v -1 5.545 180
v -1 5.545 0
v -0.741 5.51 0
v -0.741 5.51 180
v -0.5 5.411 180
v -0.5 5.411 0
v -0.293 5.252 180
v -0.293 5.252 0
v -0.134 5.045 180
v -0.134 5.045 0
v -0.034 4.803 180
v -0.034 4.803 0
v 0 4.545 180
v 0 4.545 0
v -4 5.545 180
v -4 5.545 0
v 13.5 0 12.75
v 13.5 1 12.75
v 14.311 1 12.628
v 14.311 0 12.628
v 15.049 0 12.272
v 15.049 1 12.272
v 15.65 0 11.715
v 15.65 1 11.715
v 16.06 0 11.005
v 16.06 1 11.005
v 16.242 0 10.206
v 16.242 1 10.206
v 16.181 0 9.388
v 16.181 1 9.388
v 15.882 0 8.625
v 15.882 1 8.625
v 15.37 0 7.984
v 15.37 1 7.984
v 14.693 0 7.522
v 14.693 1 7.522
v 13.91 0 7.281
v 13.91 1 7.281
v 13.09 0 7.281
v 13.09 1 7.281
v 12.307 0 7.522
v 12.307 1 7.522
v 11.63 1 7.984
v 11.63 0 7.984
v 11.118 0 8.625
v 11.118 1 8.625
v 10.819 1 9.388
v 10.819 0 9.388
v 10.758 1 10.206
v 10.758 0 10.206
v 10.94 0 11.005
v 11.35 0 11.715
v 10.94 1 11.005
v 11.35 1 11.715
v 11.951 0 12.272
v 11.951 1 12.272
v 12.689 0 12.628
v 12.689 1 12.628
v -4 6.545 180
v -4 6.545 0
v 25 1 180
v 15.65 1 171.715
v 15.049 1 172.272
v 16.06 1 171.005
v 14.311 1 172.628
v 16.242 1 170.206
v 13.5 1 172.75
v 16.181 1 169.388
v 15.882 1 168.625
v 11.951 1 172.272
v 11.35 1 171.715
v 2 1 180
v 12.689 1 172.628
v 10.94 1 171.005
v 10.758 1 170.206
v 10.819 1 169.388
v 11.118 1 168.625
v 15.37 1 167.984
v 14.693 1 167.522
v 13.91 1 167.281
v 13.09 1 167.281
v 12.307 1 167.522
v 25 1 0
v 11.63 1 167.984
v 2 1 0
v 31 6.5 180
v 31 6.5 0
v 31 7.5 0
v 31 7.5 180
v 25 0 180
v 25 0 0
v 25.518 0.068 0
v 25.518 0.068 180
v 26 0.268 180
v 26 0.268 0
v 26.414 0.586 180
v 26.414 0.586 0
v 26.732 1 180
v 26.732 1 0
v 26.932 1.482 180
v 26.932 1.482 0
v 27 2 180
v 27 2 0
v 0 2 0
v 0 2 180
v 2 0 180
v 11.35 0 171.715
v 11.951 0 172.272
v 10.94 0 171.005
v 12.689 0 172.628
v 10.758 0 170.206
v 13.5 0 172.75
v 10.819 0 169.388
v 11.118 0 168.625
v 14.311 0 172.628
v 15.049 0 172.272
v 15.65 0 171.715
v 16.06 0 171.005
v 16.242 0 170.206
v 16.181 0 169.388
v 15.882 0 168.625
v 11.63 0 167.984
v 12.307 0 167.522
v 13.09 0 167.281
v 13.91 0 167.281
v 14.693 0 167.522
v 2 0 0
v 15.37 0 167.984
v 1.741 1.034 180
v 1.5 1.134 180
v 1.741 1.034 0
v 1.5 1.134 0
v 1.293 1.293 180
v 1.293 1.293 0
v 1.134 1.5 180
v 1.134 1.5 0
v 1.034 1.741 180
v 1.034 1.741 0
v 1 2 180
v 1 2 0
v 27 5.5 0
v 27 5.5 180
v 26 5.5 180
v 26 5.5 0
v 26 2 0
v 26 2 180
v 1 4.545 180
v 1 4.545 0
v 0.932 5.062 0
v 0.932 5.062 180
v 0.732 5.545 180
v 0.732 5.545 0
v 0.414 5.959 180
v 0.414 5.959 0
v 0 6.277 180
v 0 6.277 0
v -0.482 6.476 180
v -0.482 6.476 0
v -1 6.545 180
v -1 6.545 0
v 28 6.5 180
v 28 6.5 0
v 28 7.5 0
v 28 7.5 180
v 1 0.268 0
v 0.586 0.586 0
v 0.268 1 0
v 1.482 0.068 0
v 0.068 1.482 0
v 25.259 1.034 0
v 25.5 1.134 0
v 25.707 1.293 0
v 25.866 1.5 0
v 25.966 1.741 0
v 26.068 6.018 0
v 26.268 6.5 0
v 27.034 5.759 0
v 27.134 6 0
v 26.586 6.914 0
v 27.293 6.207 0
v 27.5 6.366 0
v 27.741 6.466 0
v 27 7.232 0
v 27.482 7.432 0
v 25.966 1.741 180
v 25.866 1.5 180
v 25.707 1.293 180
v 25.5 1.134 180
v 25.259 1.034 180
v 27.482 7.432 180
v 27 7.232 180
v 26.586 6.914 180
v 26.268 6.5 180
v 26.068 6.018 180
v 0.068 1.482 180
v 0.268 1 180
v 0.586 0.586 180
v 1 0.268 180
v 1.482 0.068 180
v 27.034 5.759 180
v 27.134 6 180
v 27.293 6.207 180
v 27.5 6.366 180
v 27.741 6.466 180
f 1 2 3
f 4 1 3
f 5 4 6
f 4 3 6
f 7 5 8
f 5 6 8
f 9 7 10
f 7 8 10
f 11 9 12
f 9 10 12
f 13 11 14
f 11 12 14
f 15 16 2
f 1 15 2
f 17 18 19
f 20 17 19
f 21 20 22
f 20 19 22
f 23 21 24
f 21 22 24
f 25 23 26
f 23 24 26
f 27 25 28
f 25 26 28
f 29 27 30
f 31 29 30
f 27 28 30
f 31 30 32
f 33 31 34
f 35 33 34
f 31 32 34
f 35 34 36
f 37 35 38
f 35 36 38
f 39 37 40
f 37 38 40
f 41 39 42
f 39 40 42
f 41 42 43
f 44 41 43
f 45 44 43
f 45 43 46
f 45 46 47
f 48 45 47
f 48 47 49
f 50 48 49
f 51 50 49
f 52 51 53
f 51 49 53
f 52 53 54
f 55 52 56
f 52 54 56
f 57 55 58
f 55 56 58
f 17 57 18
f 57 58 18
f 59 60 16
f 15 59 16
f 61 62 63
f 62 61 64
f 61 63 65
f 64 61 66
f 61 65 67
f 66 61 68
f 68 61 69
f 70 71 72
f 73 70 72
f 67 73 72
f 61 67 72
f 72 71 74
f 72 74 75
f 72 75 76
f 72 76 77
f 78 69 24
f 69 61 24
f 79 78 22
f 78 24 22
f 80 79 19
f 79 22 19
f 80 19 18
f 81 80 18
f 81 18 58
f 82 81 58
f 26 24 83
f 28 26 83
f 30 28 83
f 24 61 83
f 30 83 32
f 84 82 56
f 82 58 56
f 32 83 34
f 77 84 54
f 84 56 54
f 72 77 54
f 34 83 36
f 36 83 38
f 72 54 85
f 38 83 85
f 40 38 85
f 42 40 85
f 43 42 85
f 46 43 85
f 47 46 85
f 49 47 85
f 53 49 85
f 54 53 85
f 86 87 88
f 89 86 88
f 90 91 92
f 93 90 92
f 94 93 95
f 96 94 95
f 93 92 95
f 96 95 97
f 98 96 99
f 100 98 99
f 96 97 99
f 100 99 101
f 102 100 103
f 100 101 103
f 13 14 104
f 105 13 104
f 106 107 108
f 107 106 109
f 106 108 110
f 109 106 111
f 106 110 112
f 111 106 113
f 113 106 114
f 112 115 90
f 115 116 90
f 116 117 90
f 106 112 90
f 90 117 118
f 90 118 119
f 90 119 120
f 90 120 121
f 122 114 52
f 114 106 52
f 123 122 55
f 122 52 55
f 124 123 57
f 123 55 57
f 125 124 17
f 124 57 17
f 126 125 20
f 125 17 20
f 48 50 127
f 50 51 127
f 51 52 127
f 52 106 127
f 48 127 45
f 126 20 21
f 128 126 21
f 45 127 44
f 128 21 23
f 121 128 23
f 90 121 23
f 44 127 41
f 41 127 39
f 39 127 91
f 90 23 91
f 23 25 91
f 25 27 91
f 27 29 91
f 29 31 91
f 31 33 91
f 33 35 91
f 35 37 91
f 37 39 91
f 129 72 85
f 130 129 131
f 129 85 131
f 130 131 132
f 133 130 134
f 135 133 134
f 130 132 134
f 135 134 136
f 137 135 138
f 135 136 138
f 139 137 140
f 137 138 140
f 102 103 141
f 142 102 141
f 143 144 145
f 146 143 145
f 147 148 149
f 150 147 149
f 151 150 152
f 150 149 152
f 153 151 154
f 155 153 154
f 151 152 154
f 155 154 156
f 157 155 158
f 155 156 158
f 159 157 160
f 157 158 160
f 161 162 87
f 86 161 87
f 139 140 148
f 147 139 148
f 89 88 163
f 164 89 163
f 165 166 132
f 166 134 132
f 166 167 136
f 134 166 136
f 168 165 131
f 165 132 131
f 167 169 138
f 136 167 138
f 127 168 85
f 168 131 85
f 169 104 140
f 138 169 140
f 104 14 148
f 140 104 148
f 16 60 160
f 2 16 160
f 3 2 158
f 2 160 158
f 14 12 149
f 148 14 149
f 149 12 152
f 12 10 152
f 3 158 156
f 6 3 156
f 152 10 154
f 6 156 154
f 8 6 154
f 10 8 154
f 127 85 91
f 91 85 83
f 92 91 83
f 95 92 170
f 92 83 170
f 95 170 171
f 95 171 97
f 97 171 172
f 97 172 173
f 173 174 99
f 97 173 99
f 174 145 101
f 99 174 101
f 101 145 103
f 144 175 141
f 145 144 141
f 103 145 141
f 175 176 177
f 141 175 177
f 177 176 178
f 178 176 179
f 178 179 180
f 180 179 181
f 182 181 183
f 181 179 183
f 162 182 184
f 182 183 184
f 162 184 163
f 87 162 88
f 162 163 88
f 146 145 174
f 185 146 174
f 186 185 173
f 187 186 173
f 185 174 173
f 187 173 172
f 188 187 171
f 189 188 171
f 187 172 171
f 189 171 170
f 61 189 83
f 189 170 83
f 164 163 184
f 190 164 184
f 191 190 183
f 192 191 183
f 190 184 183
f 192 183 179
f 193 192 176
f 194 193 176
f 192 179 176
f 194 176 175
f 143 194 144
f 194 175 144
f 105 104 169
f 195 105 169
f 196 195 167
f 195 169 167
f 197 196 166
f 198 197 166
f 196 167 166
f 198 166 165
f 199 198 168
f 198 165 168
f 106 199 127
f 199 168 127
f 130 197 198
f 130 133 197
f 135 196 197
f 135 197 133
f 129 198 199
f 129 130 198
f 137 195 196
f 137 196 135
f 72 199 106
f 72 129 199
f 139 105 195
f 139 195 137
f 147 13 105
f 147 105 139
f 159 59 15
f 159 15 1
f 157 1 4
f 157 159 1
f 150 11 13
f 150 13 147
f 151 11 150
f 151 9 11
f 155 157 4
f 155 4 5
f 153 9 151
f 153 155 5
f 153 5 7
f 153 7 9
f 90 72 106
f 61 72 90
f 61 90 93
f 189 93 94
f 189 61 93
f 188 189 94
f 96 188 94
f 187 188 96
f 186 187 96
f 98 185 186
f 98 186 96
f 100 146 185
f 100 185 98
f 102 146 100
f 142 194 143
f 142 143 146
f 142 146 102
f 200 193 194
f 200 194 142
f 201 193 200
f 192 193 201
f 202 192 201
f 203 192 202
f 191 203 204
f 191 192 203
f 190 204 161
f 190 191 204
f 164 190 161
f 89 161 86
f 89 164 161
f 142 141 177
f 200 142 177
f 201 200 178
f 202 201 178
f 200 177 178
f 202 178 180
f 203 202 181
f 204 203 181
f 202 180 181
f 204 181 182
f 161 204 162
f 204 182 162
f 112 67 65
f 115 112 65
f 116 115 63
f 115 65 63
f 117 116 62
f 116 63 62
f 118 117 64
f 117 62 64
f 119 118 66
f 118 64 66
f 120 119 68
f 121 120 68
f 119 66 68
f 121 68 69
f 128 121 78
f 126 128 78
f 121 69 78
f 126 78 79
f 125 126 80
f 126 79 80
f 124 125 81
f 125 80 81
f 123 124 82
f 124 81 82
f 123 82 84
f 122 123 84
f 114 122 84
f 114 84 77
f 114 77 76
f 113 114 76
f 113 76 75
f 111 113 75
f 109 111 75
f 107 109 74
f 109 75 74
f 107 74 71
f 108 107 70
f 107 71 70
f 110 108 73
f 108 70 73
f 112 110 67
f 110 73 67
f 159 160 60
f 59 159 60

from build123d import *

# Parameters (mm, degrees)
BOSS_EXTRUDE1_DEPTH = 180
SKETCH2_R           = 2.75
CUT_EXTRUDE1_DEPTH  = 1


with BuildPart() as part:
    # Sketch1 → Boss-Extrude1 (new body)
    with BuildSketch(Plane.XY):
        with BuildLine():
            Line((2, 0), (25, 0))
            ThreePointArc((25, 0), (26.414213562, 0.585786438), (27, 2))
            Line((27, 2), (27, 5.5))
            ThreePointArc((27, 5.5), (27.292893219, 6.207106781), (28, 6.5))
            Line((28, 6.5), (31, 6.5))
            Line((31, 6.5), (31, 7.5))
            Line((31, 7.5), (28, 7.5))
            ThreePointArc((28, 7.5), (26.585786438, 6.914213562), (26, 5.5))
            Line((26, 5.5), (26, 2))
            ThreePointArc((26, 2), (25.707106781, 1.292893219), (25, 1))
            Line((25, 1), (2, 1))
            ThreePointArc((2, 1), (1.292893219, 1.292893219), (1, 2))
            Line((1, 2), (1, 4.544540718))
            ThreePointArc((1, 4.544540718), (0.414213562, 5.95875428), (-1, 6.544540718))
            Line((-1, 6.544540718), (-4, 6.544540718))
            Line((-4, 6.544540718), (-4, 5.544540718))
            Line((-4, 5.544540718), (-1, 5.544540718))
            ThreePointArc((-1, 5.544540718), (-0.292893219, 5.251647499), (0, 4.544540718))
            Line((0, 4.544540718), (0, 2))
            ThreePointArc((0, 2), (0.585786438, 0.585786438), (2, 0))
        make_face()
    extrude(amount=BOSS_EXTRUDE1_DEPTH)

    # Sketch2 → Cut-Extrude1 (cut)
    with BuildSketch(Plane(origin=(0, 1, 0), x_dir=(1, 0, 0), z_dir=(0, 1, 0))):
        with Locations(Location((13.5, -10, 0), (0, 0, 270))):
            Circle(SKETCH2_R)
        with Locations(Location((13.5, -170, 0), (0, 0, 270))):
            Circle(SKETCH2_R)
    extrude(amount=-CUT_EXTRUDE1_DEPTH, mode=Mode.SUBTRACT)


solid = part.part
